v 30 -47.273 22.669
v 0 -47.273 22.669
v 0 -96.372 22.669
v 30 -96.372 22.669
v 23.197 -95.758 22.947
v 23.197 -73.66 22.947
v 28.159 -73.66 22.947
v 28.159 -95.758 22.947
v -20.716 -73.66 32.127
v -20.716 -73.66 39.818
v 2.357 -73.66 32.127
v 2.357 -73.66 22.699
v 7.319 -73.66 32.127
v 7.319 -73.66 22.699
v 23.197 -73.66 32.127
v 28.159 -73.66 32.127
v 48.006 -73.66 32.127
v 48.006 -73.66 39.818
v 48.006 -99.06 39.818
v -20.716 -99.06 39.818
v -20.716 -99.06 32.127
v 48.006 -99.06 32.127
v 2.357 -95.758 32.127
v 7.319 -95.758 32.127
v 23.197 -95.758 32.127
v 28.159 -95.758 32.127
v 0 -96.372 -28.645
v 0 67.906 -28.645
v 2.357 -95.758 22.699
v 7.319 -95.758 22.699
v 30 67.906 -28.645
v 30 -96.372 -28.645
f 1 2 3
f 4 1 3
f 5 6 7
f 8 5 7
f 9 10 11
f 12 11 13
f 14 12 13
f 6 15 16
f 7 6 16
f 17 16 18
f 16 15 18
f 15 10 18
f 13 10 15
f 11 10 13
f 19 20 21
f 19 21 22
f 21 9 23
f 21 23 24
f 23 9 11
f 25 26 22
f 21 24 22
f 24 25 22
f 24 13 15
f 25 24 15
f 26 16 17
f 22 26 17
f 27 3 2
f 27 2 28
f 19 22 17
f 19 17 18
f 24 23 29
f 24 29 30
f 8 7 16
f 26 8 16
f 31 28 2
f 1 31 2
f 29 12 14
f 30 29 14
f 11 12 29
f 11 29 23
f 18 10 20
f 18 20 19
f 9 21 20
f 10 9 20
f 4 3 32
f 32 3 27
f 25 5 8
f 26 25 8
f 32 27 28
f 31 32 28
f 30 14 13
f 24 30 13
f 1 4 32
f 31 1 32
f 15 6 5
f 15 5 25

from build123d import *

# Parameters (mm, degrees)
F1_DEPTH = 30
F3_W     = 68.72177
F3_H     = 7.690884
F4_DEPTH = 25.4
F5_W     = 4.961859
F5_H     = 9.675625
F5_W_2   = 4.96186
F5_H_2   = 9.427534
F6_DEPTH = 22.098


with BuildPart() as f1:
    # F0 (on Right) → F1 (new body)
    with BuildSketch(Plane.YZ):
        Polygon((-47.27333, 22.66884), (-96.372128, 22.66884), (-96.372128, -28.644944), (67.905806, -28.644944), align=None)
    extrude(amount=F1_DEPTH)


with BuildPart() as f4:
    # F3 (on offset) → F4 (new body)
    with BuildSketch(Plane.XZ.offset(73.66)):
        with Locations((13.645117, 35.972077)):
            Rectangle(F3_W, F3_H)
    extrude(amount=F4_DEPTH)

    # F5 (on offset) → F6 (join)
    with BuildSketch(Plane.XZ.offset(73.66)):
        with Locations((4.837814, 27.536915)):
            Rectangle(F5_W, F5_H)
        with Locations((25.677629, 27.660961)):
            Rectangle(F5_W_2, F5_H_2)
    extrude(amount=F6_DEPTH)


solid = Compound([f1.part, f4.part])
